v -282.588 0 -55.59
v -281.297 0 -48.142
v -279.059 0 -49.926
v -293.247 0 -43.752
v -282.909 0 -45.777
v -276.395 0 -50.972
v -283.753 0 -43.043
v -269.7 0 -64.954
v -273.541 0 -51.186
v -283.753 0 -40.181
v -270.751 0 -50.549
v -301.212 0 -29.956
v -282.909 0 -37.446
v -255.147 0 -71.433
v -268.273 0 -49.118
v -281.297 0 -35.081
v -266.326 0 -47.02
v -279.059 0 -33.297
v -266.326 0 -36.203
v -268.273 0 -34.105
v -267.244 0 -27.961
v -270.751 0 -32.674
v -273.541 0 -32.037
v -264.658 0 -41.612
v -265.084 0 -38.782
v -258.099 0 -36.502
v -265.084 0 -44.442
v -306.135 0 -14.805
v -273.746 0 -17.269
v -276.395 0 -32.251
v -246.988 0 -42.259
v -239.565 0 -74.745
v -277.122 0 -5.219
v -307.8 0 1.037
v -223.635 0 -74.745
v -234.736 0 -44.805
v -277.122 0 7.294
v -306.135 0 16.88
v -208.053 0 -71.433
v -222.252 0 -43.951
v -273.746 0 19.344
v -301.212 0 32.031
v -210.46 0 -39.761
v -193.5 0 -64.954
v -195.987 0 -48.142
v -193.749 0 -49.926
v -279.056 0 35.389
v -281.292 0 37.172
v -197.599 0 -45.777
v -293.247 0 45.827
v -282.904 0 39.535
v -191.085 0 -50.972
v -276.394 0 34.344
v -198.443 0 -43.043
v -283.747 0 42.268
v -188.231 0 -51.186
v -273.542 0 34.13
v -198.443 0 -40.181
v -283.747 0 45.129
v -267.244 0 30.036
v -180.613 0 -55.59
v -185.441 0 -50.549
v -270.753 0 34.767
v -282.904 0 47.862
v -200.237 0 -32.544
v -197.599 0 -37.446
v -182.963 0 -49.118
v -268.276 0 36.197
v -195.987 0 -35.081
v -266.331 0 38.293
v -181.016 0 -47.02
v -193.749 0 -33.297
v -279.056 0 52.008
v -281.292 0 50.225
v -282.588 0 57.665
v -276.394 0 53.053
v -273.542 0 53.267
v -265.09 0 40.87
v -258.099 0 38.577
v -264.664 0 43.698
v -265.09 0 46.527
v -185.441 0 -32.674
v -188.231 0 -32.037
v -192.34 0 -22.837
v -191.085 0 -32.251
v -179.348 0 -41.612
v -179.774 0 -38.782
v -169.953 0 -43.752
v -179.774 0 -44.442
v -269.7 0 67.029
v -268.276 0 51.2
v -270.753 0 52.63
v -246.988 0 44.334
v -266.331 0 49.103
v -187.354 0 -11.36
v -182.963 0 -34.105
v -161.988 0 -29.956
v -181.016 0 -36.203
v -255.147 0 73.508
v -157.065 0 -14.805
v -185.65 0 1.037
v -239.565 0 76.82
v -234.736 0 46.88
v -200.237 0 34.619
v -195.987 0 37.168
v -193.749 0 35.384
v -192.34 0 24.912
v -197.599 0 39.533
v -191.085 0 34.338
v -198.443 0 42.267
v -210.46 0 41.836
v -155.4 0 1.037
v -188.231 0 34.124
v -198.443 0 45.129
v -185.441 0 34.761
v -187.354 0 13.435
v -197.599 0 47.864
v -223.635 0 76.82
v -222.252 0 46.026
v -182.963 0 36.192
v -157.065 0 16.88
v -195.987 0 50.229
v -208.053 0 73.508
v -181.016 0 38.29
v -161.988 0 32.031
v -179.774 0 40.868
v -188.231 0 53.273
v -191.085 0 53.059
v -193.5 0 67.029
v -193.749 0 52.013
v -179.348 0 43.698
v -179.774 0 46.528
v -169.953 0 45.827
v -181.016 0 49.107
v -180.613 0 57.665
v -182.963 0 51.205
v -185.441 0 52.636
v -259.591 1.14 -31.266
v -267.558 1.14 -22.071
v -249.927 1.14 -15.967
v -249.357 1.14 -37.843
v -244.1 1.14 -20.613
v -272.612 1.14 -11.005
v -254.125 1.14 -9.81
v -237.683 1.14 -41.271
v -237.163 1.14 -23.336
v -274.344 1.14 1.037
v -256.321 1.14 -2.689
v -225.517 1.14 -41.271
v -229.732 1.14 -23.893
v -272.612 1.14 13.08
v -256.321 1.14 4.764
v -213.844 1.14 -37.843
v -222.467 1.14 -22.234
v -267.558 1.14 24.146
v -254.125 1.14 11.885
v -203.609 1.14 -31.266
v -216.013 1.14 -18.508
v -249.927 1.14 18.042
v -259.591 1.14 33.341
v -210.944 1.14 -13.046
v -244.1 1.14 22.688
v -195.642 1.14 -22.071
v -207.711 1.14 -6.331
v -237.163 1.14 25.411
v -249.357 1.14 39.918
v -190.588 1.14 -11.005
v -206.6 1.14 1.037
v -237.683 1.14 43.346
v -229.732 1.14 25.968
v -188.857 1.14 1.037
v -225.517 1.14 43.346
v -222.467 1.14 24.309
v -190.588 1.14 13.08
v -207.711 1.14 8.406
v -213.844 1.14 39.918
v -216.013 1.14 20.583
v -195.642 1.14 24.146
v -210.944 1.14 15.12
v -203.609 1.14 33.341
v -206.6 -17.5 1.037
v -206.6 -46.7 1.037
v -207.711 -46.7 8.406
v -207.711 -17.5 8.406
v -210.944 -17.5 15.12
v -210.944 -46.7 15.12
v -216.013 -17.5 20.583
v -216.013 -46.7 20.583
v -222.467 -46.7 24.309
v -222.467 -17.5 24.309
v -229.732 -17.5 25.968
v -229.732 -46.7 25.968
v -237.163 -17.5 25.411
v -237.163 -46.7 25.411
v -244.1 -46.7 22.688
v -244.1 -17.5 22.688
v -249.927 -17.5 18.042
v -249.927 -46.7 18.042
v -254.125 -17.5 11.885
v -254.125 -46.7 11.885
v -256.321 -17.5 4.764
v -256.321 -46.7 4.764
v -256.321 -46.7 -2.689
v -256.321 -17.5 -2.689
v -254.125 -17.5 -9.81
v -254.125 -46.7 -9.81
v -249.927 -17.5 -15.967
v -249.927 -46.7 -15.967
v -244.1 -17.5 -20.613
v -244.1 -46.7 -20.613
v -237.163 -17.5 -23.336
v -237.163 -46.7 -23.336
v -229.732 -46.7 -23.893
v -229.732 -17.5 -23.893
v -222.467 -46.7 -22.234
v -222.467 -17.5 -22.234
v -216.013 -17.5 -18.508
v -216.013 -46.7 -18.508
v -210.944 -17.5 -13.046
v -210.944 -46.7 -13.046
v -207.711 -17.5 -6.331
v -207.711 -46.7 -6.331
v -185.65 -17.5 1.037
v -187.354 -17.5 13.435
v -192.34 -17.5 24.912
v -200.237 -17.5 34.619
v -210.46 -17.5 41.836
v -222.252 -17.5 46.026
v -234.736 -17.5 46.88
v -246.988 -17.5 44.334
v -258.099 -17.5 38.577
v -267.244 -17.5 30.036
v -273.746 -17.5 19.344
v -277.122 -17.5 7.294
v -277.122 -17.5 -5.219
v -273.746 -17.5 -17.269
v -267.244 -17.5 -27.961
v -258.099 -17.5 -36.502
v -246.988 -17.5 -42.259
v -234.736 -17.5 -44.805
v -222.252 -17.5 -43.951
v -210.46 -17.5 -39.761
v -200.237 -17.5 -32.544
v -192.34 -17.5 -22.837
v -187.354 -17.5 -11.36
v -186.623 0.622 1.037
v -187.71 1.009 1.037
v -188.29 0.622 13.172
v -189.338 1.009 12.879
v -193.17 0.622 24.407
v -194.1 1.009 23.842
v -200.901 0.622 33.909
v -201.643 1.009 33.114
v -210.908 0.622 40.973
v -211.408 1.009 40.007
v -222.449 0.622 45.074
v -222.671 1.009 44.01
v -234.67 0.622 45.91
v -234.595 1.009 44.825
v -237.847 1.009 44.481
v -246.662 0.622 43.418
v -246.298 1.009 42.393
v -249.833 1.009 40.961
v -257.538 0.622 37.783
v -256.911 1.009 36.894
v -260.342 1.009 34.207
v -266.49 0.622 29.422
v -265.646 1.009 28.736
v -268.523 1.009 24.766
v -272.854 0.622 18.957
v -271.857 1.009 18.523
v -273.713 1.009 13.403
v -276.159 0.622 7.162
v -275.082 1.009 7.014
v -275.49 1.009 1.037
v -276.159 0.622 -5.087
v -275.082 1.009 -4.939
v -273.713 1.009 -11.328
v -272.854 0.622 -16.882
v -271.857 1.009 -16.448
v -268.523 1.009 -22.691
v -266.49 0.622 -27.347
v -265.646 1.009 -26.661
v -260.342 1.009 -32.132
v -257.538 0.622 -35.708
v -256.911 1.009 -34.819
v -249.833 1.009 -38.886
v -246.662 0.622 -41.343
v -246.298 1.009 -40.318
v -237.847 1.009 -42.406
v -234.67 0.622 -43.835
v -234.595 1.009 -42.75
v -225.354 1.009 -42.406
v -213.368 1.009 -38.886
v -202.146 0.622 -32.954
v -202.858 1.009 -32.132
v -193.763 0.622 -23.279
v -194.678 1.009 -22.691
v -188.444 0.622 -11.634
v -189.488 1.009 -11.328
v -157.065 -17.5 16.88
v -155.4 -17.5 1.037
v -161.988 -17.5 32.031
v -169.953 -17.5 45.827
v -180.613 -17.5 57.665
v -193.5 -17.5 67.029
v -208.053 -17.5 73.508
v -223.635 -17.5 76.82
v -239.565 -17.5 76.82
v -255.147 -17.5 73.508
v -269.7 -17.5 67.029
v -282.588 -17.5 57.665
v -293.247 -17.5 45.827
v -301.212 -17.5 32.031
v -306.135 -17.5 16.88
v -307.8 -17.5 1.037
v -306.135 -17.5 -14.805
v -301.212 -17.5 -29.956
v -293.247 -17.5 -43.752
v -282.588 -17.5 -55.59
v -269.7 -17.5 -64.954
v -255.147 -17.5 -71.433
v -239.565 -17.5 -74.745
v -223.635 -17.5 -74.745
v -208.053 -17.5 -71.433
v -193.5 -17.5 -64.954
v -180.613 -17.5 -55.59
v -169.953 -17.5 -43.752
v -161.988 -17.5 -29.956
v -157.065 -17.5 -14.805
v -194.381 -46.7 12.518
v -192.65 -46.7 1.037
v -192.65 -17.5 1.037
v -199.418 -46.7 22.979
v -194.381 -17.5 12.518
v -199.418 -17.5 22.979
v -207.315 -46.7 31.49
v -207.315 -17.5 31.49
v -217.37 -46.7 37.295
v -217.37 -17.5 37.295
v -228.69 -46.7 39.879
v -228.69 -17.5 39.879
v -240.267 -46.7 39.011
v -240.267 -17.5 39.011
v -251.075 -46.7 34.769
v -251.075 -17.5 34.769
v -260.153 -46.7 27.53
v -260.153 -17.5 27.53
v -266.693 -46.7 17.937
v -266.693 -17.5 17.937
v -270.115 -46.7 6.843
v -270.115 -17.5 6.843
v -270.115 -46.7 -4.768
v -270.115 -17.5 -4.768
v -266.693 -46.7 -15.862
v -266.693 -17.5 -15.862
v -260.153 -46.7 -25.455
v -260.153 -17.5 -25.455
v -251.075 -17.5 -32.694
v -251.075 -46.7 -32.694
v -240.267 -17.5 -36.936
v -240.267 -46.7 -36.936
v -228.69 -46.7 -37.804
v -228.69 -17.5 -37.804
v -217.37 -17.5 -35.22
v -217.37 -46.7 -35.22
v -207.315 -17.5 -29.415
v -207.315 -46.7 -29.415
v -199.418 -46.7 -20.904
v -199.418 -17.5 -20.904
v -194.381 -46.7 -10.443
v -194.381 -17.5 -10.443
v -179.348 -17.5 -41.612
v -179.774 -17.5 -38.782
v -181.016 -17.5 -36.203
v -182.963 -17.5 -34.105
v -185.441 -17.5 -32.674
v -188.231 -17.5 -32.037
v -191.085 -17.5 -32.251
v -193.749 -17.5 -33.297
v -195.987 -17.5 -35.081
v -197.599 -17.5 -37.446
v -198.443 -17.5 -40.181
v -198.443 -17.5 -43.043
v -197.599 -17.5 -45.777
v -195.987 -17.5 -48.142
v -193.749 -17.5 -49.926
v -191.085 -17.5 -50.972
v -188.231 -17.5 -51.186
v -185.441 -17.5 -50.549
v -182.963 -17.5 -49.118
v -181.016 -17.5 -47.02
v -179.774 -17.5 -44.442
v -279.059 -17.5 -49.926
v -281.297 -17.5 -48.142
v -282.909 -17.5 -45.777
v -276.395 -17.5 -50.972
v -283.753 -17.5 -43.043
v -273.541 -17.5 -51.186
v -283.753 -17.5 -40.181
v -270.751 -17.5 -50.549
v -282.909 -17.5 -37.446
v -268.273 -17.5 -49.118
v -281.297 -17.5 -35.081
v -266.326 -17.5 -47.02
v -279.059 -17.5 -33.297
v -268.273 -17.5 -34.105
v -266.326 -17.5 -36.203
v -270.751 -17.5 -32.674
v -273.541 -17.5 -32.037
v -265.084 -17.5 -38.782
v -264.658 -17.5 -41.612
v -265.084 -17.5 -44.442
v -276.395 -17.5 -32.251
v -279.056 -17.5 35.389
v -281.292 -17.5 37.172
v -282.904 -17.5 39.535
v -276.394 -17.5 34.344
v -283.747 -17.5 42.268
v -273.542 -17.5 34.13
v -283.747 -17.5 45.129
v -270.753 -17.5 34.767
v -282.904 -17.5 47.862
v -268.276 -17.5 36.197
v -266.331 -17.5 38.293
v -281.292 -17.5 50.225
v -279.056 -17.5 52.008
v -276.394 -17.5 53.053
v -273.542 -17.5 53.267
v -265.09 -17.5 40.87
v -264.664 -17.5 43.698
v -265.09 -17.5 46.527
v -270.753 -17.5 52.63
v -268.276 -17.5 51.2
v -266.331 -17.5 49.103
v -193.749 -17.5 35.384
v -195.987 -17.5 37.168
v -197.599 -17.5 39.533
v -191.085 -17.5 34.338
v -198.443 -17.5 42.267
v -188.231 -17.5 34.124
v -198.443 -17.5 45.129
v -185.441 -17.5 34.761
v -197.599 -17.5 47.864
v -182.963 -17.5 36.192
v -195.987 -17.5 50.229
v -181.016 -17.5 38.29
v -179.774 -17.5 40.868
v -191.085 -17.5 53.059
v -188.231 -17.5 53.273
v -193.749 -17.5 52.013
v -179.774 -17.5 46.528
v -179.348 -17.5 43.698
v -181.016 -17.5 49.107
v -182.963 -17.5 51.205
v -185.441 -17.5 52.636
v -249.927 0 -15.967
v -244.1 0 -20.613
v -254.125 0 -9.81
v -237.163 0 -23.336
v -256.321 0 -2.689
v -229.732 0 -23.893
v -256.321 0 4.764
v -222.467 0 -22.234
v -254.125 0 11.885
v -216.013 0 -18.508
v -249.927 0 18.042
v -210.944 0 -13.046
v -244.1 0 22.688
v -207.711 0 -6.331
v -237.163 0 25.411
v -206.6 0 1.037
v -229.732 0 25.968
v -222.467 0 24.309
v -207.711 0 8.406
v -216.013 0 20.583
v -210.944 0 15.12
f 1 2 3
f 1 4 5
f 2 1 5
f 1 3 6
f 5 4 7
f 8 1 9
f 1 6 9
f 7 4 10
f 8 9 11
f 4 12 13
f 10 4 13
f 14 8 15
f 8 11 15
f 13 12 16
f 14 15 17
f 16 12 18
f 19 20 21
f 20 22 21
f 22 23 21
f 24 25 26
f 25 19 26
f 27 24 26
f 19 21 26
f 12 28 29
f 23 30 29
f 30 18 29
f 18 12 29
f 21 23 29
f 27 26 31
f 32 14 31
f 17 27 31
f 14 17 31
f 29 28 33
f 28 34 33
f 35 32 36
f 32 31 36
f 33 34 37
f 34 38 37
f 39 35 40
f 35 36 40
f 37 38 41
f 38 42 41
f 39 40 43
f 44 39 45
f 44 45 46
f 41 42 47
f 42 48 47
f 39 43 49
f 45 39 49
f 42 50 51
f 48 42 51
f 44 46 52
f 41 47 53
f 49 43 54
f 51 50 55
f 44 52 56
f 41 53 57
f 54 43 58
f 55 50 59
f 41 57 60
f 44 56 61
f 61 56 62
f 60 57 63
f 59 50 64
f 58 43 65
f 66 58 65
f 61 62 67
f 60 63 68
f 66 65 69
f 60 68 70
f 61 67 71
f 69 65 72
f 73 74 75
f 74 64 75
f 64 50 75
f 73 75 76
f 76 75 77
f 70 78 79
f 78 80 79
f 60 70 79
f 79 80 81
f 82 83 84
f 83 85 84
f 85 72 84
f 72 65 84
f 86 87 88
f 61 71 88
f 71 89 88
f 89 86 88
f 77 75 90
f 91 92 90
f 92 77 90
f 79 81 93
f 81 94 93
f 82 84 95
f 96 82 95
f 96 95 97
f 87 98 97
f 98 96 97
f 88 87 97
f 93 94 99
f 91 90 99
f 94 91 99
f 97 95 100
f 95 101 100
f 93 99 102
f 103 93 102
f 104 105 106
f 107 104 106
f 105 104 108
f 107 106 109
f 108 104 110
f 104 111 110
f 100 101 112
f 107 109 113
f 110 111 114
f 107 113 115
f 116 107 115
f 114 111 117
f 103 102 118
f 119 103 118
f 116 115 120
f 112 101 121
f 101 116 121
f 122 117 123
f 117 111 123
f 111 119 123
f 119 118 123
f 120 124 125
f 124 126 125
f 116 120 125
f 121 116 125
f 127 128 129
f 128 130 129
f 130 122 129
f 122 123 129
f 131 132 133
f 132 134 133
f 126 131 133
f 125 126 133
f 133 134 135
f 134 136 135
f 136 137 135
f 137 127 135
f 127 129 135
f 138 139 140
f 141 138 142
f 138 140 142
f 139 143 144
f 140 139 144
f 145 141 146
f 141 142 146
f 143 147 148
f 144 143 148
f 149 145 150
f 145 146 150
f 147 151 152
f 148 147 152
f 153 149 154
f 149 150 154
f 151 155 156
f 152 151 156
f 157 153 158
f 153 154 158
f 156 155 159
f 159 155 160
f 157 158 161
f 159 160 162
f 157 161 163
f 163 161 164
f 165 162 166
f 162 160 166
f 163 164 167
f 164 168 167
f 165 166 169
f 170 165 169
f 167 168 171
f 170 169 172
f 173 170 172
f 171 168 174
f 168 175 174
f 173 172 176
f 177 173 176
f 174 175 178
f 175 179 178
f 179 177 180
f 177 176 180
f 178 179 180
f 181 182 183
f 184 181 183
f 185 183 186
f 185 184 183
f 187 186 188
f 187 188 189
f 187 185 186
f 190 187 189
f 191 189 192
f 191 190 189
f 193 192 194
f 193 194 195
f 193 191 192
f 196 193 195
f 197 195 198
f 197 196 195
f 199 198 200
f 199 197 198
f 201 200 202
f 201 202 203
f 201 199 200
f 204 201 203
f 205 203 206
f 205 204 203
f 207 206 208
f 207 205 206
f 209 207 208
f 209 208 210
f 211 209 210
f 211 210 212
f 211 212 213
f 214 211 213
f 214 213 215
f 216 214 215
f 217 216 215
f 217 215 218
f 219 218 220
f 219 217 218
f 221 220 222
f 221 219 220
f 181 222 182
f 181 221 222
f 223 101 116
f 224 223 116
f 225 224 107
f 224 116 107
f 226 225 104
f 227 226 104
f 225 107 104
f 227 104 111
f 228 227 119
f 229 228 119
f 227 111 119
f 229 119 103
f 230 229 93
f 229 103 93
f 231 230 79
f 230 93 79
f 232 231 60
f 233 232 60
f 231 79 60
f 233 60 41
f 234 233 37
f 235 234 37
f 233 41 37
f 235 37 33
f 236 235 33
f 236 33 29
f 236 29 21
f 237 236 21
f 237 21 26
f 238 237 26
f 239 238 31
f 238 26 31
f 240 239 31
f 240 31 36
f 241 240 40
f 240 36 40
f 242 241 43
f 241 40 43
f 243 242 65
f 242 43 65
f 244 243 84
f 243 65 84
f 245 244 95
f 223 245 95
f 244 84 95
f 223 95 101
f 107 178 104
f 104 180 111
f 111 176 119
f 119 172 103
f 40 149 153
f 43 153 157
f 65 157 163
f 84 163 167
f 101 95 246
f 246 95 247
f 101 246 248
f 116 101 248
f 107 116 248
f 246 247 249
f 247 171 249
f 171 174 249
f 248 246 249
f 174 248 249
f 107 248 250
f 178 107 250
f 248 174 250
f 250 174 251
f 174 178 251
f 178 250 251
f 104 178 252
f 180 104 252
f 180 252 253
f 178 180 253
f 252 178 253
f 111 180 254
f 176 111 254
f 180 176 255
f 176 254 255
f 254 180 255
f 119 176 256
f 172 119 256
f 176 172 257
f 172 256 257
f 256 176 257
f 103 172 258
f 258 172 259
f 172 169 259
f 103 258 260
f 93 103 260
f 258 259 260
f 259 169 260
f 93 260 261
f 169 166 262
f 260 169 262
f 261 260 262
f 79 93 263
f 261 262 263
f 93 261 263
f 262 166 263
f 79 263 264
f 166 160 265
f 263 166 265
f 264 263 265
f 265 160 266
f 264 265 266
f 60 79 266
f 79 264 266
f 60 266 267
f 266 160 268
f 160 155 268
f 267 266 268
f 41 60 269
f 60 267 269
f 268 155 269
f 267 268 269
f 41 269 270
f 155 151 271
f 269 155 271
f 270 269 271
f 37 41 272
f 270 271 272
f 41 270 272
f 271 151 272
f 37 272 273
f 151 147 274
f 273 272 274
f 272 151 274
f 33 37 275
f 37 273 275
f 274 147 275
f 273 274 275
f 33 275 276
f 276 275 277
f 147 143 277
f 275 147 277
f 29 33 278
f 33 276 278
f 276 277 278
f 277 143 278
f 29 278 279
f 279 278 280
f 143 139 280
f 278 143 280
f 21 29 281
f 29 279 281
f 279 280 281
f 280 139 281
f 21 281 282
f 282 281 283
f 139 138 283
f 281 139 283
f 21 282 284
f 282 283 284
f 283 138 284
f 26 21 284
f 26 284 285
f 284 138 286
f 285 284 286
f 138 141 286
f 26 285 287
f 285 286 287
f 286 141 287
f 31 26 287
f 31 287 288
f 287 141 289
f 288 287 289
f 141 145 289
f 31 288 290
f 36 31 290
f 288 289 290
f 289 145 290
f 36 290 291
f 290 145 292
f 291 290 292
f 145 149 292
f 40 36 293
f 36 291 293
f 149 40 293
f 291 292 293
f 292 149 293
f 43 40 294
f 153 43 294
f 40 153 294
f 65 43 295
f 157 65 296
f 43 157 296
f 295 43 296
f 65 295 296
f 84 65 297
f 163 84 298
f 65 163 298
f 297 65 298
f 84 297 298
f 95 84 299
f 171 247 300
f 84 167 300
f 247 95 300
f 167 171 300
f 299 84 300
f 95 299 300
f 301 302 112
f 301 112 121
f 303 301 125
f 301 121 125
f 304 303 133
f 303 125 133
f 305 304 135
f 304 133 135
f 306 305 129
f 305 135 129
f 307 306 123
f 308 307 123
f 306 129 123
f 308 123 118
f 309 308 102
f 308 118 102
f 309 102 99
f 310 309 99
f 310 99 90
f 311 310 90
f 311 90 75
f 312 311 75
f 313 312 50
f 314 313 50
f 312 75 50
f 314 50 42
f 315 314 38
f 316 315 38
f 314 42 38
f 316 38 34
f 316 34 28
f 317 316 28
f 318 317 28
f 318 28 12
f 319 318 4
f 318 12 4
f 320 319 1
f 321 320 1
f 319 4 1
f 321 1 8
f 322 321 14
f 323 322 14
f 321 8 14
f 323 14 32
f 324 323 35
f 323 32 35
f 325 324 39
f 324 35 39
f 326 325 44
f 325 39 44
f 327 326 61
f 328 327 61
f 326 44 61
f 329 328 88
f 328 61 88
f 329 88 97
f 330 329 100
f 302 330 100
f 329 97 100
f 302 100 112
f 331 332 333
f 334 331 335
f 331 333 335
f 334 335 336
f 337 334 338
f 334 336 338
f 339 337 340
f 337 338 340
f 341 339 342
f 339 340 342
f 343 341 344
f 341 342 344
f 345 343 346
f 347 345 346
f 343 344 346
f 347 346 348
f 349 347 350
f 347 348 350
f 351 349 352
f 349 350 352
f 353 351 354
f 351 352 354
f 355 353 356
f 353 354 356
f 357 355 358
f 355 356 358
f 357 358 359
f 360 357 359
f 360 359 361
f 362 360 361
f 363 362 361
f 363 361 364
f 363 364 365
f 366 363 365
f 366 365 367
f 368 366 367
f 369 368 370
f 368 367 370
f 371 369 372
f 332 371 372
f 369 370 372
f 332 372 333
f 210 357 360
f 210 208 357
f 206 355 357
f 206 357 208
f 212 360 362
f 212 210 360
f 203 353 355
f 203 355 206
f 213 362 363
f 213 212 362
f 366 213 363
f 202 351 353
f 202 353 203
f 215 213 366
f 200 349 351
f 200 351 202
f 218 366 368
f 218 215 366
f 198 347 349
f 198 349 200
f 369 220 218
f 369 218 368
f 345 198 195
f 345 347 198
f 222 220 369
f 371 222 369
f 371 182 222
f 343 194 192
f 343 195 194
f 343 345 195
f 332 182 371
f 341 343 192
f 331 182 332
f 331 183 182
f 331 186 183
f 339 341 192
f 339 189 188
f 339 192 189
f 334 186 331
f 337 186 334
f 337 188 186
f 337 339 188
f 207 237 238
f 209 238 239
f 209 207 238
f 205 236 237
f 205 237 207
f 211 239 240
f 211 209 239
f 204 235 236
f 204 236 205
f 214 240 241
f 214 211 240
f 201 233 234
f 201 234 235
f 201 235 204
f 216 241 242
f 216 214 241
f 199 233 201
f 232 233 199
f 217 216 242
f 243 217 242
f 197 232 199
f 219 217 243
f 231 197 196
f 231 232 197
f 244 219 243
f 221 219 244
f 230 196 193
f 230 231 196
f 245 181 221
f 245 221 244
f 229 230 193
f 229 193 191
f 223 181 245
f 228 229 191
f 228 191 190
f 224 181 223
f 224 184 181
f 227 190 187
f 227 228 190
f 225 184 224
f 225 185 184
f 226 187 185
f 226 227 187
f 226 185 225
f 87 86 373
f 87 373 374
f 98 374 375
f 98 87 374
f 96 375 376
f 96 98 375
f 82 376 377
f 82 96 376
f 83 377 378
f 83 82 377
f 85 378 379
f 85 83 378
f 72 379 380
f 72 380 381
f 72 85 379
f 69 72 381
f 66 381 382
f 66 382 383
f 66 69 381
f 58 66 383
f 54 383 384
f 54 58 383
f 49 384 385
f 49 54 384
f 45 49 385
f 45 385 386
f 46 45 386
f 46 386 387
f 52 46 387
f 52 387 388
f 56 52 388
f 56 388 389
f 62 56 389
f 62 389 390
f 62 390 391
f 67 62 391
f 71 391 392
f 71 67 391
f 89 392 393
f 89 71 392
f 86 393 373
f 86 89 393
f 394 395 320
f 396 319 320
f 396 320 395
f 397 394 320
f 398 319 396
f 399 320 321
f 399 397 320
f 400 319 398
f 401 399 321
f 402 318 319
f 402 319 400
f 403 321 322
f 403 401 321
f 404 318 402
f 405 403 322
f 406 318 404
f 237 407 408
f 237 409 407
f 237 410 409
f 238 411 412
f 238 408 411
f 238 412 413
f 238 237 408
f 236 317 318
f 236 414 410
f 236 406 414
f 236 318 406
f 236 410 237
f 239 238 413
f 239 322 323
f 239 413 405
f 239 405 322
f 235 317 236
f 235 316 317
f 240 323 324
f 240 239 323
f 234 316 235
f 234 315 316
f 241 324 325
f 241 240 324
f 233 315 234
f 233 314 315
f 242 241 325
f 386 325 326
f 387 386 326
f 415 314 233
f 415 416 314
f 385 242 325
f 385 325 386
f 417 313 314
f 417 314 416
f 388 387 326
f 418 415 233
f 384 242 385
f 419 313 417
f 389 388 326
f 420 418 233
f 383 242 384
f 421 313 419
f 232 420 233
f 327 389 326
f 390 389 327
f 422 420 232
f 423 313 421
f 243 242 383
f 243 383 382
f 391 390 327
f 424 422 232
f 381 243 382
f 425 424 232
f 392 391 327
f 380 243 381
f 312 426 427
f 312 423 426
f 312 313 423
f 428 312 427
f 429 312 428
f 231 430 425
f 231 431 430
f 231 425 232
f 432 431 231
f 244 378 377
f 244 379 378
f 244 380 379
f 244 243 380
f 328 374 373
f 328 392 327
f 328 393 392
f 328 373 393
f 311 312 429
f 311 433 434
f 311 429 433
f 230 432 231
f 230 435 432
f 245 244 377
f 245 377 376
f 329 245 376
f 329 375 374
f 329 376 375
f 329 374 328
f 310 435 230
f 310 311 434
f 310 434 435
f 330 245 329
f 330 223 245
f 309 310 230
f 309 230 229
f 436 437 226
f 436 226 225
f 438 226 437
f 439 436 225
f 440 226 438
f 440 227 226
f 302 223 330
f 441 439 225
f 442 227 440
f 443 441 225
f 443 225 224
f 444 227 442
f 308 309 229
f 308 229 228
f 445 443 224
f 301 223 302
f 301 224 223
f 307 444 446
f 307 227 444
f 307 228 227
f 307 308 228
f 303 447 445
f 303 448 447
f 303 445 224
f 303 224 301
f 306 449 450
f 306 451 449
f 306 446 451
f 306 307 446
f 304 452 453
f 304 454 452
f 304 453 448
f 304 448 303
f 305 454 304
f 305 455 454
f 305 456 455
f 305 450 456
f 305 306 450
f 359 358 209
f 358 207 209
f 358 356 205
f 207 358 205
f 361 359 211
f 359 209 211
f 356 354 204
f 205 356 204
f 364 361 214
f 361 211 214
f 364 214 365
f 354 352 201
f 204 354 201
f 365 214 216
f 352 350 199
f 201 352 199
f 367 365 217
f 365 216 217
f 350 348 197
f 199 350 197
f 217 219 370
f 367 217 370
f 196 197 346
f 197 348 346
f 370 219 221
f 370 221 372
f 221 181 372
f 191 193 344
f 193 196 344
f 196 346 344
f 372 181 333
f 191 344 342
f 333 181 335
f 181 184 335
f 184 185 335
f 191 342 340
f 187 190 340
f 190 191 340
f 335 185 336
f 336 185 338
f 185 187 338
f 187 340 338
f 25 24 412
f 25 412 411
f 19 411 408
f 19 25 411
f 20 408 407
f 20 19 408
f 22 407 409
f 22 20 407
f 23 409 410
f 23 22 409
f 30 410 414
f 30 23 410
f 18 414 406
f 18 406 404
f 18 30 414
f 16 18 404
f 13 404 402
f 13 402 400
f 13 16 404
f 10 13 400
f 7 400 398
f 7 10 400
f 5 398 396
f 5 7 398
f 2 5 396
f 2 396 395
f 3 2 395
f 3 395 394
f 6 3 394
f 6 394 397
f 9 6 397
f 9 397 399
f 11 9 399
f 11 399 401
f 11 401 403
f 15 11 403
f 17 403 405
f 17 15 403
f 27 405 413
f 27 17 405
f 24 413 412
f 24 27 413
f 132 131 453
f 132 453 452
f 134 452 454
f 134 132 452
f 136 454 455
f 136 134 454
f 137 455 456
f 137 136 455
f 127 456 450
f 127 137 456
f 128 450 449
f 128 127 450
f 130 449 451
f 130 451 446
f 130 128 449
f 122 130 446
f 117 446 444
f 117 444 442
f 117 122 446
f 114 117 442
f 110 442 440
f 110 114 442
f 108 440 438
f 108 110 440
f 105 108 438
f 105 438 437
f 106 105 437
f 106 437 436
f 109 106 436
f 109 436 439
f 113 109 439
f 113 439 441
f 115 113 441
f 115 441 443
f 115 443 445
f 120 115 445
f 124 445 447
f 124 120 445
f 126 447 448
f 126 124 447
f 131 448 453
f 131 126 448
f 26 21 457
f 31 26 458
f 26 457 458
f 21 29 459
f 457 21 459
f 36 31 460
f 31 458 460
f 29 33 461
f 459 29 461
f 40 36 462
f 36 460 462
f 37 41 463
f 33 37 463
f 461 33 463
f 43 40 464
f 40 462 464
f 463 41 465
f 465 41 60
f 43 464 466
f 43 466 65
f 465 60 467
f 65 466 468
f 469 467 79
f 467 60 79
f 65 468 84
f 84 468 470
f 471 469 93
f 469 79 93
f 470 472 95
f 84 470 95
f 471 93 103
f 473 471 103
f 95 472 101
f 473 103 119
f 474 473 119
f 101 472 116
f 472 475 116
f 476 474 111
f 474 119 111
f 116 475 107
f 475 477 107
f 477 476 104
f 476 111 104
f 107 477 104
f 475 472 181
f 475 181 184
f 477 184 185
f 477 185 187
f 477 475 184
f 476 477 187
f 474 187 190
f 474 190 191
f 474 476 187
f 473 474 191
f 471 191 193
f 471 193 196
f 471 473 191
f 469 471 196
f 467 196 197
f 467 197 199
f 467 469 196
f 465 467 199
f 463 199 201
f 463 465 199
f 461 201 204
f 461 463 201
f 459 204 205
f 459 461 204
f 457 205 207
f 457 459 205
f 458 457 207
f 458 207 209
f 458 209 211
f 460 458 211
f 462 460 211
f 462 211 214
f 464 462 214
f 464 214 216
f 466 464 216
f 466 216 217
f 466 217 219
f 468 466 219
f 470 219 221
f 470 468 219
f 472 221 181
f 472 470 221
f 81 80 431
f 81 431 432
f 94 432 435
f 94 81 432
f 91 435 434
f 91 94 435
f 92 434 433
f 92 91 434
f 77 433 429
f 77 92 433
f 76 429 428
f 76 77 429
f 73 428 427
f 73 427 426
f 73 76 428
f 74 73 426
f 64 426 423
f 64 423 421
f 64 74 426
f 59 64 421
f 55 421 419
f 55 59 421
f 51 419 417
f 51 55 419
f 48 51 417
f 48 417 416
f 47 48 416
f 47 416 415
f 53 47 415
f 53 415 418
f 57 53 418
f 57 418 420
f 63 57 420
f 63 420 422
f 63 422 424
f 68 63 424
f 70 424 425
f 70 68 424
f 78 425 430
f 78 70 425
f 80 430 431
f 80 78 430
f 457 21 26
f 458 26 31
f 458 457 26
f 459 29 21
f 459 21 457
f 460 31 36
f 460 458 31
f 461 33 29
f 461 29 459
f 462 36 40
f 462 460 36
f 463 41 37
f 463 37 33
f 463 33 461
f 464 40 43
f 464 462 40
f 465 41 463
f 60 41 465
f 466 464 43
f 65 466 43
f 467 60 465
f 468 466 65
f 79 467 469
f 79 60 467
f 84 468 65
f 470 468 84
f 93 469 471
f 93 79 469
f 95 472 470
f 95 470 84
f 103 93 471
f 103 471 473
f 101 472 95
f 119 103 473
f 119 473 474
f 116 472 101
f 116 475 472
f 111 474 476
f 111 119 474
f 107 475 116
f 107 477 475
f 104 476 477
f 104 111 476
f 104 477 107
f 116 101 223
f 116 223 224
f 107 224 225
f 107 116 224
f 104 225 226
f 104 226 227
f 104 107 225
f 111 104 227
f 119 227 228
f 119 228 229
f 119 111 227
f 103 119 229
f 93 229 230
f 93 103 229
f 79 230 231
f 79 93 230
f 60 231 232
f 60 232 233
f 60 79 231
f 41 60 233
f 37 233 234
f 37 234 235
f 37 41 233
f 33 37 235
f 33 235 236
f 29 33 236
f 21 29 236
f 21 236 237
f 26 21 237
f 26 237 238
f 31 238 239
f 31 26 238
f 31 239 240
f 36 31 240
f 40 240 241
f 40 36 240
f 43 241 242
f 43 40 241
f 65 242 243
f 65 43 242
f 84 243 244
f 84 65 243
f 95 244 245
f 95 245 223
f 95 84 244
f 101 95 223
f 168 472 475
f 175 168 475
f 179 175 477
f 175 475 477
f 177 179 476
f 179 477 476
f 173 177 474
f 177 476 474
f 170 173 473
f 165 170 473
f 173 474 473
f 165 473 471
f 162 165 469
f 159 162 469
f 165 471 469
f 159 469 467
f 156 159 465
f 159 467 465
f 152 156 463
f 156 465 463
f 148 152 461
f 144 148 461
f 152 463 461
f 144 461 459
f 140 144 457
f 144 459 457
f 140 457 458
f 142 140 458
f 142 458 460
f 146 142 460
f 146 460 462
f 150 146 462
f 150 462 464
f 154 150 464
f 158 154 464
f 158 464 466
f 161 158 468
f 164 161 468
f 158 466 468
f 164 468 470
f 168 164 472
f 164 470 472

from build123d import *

# Parameters (mm, degrees)
F0_R     = 76.2
F0_R_2   = 9.6012
F0_R_3   = 9.595
F0_R_4   = 45.95
F1_DEPTH = 17.5
F0_R_5   = 25
F2_DEPTH = 1.14
F4_R     = 38.95
F4_R_2   = 25
F5_DEPTH = 29.2
F6_DEPTH = 17.5


# Not quite as in the source:
# - a fillet or chamfer that OpenCascade refuses, or shapes differently, is made with other operations: its cross-section is extruded or revolved along the edge and cut away or added


with BuildPart() as f1:
    # F0 (on Front) → F1 (new body)
    with BuildSketch(Plane.XZ):
        with Locations((-231.6003055891, 1.0374736618)):
            Circle(F0_R)
        with Locations((-274.2588413703, -41.6115579362)):
            Circle(F0_R_2, mode=Mode.SUBTRACT)
        with Locations((-188.9488413703, -41.6115579362)):
            Circle(F0_R_2, mode=Mode.SUBTRACT)
        with Locations((-274.2588413703, 43.6984420638)):
            Circle(F0_R_3, mode=Mode.SUBTRACT)
        with Locations((-231.6003055891, 1.0374736618)):
            Circle(F0_R_4, mode=Mode.SUBTRACT)
        with Locations((-188.9488413703, 43.6984420638)):
            Circle(F0_R_2, mode=Mode.SUBTRACT)
    extrude(amount=F1_DEPTH)


with BuildPart() as f2:
    # F0 (on Front) → F2 (new body)
    with BuildSketch(Plane.XZ):
        with Locations((-231.6003055891, 1.0374736618)):
            Circle(F0_R_4)
        with Locations((-231.6003055891, 1.0374736618)):
            Circle(F0_R_5, mode=Mode.SUBTRACT)
    extrude(amount=-F2_DEPTH)

    # F3: fillet of radius 5.08 on 1 edges, made by hand

    # F3_s1 → F3_t2 (revolve, cut)
    with BuildSketch(Plane.XY.offset(1.0374736618)):
        with BuildLine():
            ThreePointArc((-185.6503055891, 0), (-187.155339854, 0.8465227462), (-188.8569861157, 1.14))
            Line((-188.8569861157, 1.14), (-185.6503055891, 1.14))
            Line((-185.6503055891, 1.14), (-185.6503055891, 0))
        make_face()
    revolve(axis=Axis((-231.6003055891, 1.14, 1.0374736618), (0, -1, 0)), mode=Mode.SUBTRACT)


with BuildPart() as f5:
    # F4 (on face) → F5 (new body)
    with BuildSketch(Plane.XZ.offset(17.5)):
        with Locations((-231.6003055891, 1.0374736618)):
            Circle(F4_R)
        with Locations((-231.6003055891, 1.0374736618)):
            Circle(F4_R_2, mode=Mode.SUBTRACT)
    extrude(amount=F5_DEPTH)


with BuildPart() as f6:
    # F0 (on Front) → F6 (new body)
    with BuildSketch(Plane.XZ):
        with Locations((-231.6003055891, 1.0374736618)):
            Circle(F0_R_4)
        with Locations((-231.6003055891, 1.0374736618)):
            Circle(F0_R_5, mode=Mode.SUBTRACT)
    extrude(amount=F6_DEPTH)


solid = Compound([f1.part, f2.part, f5.part, f6.part])
